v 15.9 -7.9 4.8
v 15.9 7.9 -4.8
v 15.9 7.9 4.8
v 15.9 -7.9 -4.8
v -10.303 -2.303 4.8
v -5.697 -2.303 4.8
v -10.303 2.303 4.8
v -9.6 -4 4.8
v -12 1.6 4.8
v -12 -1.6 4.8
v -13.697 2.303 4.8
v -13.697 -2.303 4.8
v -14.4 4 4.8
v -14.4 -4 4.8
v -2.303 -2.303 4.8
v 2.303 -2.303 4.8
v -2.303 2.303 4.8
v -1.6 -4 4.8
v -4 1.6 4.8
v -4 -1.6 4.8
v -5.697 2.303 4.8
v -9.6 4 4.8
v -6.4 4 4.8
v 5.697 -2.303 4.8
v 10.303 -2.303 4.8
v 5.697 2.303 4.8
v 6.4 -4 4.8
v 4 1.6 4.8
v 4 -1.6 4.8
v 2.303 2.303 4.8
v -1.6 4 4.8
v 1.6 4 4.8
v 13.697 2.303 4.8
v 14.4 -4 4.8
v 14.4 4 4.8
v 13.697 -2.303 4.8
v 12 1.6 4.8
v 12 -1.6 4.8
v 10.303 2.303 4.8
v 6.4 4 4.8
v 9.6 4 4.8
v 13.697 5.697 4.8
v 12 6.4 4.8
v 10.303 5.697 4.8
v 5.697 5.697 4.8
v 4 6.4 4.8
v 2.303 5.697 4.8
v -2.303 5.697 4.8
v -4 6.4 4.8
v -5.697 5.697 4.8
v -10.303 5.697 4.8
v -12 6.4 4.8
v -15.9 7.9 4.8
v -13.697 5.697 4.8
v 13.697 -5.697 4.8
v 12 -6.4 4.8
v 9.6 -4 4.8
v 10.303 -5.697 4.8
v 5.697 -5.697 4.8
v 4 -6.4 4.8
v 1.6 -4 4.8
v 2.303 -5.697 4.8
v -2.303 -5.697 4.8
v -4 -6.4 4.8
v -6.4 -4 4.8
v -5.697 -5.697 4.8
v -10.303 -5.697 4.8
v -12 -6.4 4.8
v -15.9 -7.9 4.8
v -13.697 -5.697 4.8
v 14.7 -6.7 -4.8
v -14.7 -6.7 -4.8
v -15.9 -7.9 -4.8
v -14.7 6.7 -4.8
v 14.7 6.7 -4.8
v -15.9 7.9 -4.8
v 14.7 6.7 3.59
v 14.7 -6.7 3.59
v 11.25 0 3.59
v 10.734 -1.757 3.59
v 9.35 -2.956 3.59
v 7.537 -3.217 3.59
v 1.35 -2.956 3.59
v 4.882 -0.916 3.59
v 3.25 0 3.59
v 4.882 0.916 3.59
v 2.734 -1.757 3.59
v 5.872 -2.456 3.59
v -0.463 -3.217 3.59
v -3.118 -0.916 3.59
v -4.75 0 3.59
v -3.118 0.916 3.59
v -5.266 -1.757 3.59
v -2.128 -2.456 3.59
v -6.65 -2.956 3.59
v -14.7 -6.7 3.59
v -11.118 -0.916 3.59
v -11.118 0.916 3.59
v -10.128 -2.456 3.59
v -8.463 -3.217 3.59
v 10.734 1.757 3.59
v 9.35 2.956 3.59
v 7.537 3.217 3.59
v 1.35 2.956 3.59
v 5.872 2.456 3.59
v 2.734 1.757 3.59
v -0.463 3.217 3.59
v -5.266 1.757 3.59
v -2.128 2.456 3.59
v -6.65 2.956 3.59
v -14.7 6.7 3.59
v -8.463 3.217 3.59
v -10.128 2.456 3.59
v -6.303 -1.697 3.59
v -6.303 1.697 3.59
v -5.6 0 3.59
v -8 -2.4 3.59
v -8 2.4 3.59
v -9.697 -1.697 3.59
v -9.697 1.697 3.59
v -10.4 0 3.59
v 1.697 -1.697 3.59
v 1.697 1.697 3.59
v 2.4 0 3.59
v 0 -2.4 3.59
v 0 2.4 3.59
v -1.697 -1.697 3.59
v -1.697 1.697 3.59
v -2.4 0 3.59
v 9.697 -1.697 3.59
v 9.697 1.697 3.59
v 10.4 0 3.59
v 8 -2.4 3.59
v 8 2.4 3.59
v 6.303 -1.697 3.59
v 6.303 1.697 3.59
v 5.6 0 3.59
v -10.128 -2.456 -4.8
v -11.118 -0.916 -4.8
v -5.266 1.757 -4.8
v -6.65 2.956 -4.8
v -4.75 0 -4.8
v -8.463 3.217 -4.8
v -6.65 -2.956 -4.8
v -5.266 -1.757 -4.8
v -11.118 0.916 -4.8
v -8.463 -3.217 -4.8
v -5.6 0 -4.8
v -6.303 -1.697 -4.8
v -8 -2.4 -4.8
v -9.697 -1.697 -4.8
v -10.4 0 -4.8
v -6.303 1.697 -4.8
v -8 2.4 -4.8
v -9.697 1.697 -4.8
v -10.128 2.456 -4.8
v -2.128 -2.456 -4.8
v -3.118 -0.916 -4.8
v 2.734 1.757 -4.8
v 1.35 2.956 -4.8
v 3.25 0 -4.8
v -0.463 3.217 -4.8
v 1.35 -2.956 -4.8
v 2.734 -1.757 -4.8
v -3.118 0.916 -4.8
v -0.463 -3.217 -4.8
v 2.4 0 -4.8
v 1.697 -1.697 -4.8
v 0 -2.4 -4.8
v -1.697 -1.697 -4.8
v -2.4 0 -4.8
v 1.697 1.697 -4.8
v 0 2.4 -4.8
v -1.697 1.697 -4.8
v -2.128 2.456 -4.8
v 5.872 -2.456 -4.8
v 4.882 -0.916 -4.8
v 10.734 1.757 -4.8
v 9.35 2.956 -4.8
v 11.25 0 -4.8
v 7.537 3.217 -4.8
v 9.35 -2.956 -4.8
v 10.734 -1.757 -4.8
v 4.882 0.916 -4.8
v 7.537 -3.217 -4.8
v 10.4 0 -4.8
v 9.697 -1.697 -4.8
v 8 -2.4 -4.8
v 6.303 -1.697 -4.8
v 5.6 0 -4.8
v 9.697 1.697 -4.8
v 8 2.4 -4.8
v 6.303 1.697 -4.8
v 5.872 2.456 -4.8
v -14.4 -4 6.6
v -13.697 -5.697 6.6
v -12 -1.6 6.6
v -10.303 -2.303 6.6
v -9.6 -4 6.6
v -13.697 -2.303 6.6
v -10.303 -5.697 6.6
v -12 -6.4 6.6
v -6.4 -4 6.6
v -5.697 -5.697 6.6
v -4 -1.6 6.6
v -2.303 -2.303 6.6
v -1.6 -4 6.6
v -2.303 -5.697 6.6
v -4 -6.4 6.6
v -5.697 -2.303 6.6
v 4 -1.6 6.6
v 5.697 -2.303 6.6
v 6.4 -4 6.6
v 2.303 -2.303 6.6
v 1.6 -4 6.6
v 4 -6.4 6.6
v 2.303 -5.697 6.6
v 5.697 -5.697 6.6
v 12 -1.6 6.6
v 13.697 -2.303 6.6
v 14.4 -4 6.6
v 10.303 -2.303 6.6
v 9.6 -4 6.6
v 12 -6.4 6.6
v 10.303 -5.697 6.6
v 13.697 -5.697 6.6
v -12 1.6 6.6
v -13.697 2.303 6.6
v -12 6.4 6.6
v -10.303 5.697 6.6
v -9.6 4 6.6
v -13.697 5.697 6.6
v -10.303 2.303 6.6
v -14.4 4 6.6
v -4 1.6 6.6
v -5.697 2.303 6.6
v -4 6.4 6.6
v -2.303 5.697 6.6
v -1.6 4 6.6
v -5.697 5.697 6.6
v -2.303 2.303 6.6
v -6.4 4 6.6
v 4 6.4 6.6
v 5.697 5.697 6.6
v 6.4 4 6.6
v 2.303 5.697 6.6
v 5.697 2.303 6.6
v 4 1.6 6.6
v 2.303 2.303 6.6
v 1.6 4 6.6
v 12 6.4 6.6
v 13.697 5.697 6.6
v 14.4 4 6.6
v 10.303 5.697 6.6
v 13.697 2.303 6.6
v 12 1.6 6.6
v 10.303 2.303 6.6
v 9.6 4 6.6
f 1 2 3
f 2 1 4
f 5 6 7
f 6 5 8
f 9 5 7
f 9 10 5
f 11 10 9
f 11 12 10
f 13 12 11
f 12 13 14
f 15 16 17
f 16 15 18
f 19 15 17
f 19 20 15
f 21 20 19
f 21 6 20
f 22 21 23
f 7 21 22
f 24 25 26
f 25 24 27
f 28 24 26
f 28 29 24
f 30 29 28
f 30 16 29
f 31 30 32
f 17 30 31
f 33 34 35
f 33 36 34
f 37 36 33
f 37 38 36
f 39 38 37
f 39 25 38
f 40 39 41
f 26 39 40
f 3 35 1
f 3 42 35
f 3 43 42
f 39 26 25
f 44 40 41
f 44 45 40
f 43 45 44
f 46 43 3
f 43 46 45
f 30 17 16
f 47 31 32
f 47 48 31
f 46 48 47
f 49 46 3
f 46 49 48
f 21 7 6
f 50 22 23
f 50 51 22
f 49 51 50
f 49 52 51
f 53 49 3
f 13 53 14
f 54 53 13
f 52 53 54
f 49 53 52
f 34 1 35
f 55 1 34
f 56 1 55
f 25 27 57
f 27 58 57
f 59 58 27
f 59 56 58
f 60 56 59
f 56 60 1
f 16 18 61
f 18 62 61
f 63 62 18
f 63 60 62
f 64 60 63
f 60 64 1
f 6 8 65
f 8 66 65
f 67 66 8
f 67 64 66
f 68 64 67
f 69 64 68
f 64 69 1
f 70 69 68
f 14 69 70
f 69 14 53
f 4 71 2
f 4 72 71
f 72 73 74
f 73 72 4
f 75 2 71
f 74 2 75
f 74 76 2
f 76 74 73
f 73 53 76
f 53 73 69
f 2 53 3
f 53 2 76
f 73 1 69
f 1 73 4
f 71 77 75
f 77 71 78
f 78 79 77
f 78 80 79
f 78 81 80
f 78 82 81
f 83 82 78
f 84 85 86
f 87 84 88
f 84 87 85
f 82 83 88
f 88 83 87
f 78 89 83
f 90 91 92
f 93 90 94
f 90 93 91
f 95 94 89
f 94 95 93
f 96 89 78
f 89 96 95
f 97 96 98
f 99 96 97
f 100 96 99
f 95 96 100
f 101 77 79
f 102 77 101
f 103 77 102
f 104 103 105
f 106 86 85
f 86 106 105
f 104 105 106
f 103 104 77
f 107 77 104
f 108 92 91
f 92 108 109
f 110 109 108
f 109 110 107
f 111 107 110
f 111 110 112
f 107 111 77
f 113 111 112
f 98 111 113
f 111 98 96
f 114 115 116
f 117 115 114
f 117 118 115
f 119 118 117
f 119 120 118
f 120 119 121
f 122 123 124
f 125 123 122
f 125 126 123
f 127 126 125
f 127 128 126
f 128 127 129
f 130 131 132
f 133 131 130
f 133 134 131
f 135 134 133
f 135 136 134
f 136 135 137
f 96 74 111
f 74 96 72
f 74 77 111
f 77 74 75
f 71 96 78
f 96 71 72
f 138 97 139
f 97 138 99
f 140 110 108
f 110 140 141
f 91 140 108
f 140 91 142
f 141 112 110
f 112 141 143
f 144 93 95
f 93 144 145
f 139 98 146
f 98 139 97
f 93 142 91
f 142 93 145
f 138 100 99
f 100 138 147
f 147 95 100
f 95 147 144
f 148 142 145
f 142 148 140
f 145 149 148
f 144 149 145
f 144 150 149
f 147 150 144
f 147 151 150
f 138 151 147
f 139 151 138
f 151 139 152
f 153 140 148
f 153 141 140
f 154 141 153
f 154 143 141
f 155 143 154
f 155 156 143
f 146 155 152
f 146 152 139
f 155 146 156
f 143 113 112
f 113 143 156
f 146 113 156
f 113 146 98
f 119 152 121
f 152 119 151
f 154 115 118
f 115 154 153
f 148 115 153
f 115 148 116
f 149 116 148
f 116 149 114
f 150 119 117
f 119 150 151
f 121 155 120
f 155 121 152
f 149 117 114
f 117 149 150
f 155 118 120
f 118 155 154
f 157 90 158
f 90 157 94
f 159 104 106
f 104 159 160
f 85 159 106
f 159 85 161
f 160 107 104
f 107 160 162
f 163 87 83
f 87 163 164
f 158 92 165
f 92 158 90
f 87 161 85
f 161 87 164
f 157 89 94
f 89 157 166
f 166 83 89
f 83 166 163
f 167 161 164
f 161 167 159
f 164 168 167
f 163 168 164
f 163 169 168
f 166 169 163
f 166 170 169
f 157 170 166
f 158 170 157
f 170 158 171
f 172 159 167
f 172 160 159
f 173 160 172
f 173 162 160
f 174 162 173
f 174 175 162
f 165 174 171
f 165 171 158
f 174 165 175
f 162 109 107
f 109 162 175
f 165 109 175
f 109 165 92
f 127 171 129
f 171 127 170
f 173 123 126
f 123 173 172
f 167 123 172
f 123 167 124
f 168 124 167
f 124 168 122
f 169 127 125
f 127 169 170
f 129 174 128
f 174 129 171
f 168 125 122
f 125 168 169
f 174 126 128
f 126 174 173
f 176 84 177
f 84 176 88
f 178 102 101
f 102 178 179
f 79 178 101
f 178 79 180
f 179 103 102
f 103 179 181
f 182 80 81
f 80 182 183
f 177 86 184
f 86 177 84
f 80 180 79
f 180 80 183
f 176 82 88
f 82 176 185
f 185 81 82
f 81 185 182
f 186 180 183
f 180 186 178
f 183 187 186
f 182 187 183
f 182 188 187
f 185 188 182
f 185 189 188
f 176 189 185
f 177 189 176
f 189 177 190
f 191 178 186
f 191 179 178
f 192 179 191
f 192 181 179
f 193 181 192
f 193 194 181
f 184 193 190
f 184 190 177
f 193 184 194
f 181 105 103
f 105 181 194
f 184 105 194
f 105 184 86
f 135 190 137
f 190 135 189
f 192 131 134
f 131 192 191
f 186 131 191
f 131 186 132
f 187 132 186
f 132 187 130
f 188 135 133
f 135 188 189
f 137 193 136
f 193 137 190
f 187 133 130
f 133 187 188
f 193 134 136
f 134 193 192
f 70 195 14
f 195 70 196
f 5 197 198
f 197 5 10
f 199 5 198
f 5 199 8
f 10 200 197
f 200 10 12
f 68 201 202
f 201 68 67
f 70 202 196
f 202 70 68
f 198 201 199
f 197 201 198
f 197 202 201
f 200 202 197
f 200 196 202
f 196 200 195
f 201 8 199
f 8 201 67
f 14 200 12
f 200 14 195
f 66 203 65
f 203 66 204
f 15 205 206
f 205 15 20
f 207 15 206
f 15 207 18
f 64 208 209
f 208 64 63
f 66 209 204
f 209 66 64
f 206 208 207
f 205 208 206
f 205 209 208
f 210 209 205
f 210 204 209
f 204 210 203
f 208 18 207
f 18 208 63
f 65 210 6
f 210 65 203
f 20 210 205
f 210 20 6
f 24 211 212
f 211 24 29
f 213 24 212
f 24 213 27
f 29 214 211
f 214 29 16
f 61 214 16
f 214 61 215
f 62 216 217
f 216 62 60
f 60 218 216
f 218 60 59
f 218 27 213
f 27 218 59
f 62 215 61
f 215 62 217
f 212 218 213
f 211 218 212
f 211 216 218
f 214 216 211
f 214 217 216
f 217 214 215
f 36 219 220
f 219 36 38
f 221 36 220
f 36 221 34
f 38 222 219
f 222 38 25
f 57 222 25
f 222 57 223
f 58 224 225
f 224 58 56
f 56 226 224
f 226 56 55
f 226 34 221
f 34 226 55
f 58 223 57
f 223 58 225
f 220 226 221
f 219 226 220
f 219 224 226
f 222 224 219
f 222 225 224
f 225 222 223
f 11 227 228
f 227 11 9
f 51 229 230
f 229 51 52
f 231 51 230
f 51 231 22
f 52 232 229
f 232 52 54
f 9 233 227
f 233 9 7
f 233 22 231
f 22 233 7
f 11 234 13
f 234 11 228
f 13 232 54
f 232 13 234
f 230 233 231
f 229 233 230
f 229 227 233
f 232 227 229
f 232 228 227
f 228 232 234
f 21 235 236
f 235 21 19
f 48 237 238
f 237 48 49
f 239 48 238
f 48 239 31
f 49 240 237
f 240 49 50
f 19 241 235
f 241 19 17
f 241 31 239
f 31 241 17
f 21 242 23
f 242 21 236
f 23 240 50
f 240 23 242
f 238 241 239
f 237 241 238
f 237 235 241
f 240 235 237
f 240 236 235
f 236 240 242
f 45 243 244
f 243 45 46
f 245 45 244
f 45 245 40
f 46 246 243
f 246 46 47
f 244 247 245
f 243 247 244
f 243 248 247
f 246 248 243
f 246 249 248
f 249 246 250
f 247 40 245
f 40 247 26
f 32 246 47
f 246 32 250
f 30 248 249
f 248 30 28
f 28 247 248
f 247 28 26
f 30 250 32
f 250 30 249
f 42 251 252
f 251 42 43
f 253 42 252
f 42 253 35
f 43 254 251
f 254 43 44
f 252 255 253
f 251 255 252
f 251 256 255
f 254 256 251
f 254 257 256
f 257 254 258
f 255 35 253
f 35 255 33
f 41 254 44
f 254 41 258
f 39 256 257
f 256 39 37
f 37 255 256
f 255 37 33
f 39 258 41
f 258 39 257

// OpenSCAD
module bottom_cyl (height){
    difference(){
        cylinder(h=height, d=6.5, center = true);
        cylinder(h=height, d=4.8, center = true);
    }
}

module block (l, w, h, clearance){
    difference(){
        cube([l*8-clearance, w*8-clearance, h], center = true);
        translate([0, 0, -0.61])
            cube([(l*8-clearance)-2.4, (w*8-clearance)-2.4, h-1.2], center = true);
        }
}

module brick (l){
    cyl_delta = 8;
    bottom_cyl_begin_x = -(l/2-1)*cyl_delta;
    top_cyl_begin_x = -((l/2)*cyl_delta)+cyl_delta/2;
    union(){
        block(l=l, w=2, h=9.6, clearance=0.2);
        for(i=[0:l-2]){
            translate([bottom_cyl_begin_x+i*cyl_delta, 0, -0.6])
                bottom_cyl(height=8.4);
            }
        for(i=[0:l-1]){
            translate([top_cyl_begin_x+i*cyl_delta, -4, 5.7])
                cylinder(h=1.8, d=4.8, center = true);
            }
        for(i=[0:l-1]){
            translate([top_cyl_begin_x+i*cyl_delta, 4, 5.7])
                cylinder(h=1.8, d=4.8, center = true);
            }
        }
}

brick(l=4);
